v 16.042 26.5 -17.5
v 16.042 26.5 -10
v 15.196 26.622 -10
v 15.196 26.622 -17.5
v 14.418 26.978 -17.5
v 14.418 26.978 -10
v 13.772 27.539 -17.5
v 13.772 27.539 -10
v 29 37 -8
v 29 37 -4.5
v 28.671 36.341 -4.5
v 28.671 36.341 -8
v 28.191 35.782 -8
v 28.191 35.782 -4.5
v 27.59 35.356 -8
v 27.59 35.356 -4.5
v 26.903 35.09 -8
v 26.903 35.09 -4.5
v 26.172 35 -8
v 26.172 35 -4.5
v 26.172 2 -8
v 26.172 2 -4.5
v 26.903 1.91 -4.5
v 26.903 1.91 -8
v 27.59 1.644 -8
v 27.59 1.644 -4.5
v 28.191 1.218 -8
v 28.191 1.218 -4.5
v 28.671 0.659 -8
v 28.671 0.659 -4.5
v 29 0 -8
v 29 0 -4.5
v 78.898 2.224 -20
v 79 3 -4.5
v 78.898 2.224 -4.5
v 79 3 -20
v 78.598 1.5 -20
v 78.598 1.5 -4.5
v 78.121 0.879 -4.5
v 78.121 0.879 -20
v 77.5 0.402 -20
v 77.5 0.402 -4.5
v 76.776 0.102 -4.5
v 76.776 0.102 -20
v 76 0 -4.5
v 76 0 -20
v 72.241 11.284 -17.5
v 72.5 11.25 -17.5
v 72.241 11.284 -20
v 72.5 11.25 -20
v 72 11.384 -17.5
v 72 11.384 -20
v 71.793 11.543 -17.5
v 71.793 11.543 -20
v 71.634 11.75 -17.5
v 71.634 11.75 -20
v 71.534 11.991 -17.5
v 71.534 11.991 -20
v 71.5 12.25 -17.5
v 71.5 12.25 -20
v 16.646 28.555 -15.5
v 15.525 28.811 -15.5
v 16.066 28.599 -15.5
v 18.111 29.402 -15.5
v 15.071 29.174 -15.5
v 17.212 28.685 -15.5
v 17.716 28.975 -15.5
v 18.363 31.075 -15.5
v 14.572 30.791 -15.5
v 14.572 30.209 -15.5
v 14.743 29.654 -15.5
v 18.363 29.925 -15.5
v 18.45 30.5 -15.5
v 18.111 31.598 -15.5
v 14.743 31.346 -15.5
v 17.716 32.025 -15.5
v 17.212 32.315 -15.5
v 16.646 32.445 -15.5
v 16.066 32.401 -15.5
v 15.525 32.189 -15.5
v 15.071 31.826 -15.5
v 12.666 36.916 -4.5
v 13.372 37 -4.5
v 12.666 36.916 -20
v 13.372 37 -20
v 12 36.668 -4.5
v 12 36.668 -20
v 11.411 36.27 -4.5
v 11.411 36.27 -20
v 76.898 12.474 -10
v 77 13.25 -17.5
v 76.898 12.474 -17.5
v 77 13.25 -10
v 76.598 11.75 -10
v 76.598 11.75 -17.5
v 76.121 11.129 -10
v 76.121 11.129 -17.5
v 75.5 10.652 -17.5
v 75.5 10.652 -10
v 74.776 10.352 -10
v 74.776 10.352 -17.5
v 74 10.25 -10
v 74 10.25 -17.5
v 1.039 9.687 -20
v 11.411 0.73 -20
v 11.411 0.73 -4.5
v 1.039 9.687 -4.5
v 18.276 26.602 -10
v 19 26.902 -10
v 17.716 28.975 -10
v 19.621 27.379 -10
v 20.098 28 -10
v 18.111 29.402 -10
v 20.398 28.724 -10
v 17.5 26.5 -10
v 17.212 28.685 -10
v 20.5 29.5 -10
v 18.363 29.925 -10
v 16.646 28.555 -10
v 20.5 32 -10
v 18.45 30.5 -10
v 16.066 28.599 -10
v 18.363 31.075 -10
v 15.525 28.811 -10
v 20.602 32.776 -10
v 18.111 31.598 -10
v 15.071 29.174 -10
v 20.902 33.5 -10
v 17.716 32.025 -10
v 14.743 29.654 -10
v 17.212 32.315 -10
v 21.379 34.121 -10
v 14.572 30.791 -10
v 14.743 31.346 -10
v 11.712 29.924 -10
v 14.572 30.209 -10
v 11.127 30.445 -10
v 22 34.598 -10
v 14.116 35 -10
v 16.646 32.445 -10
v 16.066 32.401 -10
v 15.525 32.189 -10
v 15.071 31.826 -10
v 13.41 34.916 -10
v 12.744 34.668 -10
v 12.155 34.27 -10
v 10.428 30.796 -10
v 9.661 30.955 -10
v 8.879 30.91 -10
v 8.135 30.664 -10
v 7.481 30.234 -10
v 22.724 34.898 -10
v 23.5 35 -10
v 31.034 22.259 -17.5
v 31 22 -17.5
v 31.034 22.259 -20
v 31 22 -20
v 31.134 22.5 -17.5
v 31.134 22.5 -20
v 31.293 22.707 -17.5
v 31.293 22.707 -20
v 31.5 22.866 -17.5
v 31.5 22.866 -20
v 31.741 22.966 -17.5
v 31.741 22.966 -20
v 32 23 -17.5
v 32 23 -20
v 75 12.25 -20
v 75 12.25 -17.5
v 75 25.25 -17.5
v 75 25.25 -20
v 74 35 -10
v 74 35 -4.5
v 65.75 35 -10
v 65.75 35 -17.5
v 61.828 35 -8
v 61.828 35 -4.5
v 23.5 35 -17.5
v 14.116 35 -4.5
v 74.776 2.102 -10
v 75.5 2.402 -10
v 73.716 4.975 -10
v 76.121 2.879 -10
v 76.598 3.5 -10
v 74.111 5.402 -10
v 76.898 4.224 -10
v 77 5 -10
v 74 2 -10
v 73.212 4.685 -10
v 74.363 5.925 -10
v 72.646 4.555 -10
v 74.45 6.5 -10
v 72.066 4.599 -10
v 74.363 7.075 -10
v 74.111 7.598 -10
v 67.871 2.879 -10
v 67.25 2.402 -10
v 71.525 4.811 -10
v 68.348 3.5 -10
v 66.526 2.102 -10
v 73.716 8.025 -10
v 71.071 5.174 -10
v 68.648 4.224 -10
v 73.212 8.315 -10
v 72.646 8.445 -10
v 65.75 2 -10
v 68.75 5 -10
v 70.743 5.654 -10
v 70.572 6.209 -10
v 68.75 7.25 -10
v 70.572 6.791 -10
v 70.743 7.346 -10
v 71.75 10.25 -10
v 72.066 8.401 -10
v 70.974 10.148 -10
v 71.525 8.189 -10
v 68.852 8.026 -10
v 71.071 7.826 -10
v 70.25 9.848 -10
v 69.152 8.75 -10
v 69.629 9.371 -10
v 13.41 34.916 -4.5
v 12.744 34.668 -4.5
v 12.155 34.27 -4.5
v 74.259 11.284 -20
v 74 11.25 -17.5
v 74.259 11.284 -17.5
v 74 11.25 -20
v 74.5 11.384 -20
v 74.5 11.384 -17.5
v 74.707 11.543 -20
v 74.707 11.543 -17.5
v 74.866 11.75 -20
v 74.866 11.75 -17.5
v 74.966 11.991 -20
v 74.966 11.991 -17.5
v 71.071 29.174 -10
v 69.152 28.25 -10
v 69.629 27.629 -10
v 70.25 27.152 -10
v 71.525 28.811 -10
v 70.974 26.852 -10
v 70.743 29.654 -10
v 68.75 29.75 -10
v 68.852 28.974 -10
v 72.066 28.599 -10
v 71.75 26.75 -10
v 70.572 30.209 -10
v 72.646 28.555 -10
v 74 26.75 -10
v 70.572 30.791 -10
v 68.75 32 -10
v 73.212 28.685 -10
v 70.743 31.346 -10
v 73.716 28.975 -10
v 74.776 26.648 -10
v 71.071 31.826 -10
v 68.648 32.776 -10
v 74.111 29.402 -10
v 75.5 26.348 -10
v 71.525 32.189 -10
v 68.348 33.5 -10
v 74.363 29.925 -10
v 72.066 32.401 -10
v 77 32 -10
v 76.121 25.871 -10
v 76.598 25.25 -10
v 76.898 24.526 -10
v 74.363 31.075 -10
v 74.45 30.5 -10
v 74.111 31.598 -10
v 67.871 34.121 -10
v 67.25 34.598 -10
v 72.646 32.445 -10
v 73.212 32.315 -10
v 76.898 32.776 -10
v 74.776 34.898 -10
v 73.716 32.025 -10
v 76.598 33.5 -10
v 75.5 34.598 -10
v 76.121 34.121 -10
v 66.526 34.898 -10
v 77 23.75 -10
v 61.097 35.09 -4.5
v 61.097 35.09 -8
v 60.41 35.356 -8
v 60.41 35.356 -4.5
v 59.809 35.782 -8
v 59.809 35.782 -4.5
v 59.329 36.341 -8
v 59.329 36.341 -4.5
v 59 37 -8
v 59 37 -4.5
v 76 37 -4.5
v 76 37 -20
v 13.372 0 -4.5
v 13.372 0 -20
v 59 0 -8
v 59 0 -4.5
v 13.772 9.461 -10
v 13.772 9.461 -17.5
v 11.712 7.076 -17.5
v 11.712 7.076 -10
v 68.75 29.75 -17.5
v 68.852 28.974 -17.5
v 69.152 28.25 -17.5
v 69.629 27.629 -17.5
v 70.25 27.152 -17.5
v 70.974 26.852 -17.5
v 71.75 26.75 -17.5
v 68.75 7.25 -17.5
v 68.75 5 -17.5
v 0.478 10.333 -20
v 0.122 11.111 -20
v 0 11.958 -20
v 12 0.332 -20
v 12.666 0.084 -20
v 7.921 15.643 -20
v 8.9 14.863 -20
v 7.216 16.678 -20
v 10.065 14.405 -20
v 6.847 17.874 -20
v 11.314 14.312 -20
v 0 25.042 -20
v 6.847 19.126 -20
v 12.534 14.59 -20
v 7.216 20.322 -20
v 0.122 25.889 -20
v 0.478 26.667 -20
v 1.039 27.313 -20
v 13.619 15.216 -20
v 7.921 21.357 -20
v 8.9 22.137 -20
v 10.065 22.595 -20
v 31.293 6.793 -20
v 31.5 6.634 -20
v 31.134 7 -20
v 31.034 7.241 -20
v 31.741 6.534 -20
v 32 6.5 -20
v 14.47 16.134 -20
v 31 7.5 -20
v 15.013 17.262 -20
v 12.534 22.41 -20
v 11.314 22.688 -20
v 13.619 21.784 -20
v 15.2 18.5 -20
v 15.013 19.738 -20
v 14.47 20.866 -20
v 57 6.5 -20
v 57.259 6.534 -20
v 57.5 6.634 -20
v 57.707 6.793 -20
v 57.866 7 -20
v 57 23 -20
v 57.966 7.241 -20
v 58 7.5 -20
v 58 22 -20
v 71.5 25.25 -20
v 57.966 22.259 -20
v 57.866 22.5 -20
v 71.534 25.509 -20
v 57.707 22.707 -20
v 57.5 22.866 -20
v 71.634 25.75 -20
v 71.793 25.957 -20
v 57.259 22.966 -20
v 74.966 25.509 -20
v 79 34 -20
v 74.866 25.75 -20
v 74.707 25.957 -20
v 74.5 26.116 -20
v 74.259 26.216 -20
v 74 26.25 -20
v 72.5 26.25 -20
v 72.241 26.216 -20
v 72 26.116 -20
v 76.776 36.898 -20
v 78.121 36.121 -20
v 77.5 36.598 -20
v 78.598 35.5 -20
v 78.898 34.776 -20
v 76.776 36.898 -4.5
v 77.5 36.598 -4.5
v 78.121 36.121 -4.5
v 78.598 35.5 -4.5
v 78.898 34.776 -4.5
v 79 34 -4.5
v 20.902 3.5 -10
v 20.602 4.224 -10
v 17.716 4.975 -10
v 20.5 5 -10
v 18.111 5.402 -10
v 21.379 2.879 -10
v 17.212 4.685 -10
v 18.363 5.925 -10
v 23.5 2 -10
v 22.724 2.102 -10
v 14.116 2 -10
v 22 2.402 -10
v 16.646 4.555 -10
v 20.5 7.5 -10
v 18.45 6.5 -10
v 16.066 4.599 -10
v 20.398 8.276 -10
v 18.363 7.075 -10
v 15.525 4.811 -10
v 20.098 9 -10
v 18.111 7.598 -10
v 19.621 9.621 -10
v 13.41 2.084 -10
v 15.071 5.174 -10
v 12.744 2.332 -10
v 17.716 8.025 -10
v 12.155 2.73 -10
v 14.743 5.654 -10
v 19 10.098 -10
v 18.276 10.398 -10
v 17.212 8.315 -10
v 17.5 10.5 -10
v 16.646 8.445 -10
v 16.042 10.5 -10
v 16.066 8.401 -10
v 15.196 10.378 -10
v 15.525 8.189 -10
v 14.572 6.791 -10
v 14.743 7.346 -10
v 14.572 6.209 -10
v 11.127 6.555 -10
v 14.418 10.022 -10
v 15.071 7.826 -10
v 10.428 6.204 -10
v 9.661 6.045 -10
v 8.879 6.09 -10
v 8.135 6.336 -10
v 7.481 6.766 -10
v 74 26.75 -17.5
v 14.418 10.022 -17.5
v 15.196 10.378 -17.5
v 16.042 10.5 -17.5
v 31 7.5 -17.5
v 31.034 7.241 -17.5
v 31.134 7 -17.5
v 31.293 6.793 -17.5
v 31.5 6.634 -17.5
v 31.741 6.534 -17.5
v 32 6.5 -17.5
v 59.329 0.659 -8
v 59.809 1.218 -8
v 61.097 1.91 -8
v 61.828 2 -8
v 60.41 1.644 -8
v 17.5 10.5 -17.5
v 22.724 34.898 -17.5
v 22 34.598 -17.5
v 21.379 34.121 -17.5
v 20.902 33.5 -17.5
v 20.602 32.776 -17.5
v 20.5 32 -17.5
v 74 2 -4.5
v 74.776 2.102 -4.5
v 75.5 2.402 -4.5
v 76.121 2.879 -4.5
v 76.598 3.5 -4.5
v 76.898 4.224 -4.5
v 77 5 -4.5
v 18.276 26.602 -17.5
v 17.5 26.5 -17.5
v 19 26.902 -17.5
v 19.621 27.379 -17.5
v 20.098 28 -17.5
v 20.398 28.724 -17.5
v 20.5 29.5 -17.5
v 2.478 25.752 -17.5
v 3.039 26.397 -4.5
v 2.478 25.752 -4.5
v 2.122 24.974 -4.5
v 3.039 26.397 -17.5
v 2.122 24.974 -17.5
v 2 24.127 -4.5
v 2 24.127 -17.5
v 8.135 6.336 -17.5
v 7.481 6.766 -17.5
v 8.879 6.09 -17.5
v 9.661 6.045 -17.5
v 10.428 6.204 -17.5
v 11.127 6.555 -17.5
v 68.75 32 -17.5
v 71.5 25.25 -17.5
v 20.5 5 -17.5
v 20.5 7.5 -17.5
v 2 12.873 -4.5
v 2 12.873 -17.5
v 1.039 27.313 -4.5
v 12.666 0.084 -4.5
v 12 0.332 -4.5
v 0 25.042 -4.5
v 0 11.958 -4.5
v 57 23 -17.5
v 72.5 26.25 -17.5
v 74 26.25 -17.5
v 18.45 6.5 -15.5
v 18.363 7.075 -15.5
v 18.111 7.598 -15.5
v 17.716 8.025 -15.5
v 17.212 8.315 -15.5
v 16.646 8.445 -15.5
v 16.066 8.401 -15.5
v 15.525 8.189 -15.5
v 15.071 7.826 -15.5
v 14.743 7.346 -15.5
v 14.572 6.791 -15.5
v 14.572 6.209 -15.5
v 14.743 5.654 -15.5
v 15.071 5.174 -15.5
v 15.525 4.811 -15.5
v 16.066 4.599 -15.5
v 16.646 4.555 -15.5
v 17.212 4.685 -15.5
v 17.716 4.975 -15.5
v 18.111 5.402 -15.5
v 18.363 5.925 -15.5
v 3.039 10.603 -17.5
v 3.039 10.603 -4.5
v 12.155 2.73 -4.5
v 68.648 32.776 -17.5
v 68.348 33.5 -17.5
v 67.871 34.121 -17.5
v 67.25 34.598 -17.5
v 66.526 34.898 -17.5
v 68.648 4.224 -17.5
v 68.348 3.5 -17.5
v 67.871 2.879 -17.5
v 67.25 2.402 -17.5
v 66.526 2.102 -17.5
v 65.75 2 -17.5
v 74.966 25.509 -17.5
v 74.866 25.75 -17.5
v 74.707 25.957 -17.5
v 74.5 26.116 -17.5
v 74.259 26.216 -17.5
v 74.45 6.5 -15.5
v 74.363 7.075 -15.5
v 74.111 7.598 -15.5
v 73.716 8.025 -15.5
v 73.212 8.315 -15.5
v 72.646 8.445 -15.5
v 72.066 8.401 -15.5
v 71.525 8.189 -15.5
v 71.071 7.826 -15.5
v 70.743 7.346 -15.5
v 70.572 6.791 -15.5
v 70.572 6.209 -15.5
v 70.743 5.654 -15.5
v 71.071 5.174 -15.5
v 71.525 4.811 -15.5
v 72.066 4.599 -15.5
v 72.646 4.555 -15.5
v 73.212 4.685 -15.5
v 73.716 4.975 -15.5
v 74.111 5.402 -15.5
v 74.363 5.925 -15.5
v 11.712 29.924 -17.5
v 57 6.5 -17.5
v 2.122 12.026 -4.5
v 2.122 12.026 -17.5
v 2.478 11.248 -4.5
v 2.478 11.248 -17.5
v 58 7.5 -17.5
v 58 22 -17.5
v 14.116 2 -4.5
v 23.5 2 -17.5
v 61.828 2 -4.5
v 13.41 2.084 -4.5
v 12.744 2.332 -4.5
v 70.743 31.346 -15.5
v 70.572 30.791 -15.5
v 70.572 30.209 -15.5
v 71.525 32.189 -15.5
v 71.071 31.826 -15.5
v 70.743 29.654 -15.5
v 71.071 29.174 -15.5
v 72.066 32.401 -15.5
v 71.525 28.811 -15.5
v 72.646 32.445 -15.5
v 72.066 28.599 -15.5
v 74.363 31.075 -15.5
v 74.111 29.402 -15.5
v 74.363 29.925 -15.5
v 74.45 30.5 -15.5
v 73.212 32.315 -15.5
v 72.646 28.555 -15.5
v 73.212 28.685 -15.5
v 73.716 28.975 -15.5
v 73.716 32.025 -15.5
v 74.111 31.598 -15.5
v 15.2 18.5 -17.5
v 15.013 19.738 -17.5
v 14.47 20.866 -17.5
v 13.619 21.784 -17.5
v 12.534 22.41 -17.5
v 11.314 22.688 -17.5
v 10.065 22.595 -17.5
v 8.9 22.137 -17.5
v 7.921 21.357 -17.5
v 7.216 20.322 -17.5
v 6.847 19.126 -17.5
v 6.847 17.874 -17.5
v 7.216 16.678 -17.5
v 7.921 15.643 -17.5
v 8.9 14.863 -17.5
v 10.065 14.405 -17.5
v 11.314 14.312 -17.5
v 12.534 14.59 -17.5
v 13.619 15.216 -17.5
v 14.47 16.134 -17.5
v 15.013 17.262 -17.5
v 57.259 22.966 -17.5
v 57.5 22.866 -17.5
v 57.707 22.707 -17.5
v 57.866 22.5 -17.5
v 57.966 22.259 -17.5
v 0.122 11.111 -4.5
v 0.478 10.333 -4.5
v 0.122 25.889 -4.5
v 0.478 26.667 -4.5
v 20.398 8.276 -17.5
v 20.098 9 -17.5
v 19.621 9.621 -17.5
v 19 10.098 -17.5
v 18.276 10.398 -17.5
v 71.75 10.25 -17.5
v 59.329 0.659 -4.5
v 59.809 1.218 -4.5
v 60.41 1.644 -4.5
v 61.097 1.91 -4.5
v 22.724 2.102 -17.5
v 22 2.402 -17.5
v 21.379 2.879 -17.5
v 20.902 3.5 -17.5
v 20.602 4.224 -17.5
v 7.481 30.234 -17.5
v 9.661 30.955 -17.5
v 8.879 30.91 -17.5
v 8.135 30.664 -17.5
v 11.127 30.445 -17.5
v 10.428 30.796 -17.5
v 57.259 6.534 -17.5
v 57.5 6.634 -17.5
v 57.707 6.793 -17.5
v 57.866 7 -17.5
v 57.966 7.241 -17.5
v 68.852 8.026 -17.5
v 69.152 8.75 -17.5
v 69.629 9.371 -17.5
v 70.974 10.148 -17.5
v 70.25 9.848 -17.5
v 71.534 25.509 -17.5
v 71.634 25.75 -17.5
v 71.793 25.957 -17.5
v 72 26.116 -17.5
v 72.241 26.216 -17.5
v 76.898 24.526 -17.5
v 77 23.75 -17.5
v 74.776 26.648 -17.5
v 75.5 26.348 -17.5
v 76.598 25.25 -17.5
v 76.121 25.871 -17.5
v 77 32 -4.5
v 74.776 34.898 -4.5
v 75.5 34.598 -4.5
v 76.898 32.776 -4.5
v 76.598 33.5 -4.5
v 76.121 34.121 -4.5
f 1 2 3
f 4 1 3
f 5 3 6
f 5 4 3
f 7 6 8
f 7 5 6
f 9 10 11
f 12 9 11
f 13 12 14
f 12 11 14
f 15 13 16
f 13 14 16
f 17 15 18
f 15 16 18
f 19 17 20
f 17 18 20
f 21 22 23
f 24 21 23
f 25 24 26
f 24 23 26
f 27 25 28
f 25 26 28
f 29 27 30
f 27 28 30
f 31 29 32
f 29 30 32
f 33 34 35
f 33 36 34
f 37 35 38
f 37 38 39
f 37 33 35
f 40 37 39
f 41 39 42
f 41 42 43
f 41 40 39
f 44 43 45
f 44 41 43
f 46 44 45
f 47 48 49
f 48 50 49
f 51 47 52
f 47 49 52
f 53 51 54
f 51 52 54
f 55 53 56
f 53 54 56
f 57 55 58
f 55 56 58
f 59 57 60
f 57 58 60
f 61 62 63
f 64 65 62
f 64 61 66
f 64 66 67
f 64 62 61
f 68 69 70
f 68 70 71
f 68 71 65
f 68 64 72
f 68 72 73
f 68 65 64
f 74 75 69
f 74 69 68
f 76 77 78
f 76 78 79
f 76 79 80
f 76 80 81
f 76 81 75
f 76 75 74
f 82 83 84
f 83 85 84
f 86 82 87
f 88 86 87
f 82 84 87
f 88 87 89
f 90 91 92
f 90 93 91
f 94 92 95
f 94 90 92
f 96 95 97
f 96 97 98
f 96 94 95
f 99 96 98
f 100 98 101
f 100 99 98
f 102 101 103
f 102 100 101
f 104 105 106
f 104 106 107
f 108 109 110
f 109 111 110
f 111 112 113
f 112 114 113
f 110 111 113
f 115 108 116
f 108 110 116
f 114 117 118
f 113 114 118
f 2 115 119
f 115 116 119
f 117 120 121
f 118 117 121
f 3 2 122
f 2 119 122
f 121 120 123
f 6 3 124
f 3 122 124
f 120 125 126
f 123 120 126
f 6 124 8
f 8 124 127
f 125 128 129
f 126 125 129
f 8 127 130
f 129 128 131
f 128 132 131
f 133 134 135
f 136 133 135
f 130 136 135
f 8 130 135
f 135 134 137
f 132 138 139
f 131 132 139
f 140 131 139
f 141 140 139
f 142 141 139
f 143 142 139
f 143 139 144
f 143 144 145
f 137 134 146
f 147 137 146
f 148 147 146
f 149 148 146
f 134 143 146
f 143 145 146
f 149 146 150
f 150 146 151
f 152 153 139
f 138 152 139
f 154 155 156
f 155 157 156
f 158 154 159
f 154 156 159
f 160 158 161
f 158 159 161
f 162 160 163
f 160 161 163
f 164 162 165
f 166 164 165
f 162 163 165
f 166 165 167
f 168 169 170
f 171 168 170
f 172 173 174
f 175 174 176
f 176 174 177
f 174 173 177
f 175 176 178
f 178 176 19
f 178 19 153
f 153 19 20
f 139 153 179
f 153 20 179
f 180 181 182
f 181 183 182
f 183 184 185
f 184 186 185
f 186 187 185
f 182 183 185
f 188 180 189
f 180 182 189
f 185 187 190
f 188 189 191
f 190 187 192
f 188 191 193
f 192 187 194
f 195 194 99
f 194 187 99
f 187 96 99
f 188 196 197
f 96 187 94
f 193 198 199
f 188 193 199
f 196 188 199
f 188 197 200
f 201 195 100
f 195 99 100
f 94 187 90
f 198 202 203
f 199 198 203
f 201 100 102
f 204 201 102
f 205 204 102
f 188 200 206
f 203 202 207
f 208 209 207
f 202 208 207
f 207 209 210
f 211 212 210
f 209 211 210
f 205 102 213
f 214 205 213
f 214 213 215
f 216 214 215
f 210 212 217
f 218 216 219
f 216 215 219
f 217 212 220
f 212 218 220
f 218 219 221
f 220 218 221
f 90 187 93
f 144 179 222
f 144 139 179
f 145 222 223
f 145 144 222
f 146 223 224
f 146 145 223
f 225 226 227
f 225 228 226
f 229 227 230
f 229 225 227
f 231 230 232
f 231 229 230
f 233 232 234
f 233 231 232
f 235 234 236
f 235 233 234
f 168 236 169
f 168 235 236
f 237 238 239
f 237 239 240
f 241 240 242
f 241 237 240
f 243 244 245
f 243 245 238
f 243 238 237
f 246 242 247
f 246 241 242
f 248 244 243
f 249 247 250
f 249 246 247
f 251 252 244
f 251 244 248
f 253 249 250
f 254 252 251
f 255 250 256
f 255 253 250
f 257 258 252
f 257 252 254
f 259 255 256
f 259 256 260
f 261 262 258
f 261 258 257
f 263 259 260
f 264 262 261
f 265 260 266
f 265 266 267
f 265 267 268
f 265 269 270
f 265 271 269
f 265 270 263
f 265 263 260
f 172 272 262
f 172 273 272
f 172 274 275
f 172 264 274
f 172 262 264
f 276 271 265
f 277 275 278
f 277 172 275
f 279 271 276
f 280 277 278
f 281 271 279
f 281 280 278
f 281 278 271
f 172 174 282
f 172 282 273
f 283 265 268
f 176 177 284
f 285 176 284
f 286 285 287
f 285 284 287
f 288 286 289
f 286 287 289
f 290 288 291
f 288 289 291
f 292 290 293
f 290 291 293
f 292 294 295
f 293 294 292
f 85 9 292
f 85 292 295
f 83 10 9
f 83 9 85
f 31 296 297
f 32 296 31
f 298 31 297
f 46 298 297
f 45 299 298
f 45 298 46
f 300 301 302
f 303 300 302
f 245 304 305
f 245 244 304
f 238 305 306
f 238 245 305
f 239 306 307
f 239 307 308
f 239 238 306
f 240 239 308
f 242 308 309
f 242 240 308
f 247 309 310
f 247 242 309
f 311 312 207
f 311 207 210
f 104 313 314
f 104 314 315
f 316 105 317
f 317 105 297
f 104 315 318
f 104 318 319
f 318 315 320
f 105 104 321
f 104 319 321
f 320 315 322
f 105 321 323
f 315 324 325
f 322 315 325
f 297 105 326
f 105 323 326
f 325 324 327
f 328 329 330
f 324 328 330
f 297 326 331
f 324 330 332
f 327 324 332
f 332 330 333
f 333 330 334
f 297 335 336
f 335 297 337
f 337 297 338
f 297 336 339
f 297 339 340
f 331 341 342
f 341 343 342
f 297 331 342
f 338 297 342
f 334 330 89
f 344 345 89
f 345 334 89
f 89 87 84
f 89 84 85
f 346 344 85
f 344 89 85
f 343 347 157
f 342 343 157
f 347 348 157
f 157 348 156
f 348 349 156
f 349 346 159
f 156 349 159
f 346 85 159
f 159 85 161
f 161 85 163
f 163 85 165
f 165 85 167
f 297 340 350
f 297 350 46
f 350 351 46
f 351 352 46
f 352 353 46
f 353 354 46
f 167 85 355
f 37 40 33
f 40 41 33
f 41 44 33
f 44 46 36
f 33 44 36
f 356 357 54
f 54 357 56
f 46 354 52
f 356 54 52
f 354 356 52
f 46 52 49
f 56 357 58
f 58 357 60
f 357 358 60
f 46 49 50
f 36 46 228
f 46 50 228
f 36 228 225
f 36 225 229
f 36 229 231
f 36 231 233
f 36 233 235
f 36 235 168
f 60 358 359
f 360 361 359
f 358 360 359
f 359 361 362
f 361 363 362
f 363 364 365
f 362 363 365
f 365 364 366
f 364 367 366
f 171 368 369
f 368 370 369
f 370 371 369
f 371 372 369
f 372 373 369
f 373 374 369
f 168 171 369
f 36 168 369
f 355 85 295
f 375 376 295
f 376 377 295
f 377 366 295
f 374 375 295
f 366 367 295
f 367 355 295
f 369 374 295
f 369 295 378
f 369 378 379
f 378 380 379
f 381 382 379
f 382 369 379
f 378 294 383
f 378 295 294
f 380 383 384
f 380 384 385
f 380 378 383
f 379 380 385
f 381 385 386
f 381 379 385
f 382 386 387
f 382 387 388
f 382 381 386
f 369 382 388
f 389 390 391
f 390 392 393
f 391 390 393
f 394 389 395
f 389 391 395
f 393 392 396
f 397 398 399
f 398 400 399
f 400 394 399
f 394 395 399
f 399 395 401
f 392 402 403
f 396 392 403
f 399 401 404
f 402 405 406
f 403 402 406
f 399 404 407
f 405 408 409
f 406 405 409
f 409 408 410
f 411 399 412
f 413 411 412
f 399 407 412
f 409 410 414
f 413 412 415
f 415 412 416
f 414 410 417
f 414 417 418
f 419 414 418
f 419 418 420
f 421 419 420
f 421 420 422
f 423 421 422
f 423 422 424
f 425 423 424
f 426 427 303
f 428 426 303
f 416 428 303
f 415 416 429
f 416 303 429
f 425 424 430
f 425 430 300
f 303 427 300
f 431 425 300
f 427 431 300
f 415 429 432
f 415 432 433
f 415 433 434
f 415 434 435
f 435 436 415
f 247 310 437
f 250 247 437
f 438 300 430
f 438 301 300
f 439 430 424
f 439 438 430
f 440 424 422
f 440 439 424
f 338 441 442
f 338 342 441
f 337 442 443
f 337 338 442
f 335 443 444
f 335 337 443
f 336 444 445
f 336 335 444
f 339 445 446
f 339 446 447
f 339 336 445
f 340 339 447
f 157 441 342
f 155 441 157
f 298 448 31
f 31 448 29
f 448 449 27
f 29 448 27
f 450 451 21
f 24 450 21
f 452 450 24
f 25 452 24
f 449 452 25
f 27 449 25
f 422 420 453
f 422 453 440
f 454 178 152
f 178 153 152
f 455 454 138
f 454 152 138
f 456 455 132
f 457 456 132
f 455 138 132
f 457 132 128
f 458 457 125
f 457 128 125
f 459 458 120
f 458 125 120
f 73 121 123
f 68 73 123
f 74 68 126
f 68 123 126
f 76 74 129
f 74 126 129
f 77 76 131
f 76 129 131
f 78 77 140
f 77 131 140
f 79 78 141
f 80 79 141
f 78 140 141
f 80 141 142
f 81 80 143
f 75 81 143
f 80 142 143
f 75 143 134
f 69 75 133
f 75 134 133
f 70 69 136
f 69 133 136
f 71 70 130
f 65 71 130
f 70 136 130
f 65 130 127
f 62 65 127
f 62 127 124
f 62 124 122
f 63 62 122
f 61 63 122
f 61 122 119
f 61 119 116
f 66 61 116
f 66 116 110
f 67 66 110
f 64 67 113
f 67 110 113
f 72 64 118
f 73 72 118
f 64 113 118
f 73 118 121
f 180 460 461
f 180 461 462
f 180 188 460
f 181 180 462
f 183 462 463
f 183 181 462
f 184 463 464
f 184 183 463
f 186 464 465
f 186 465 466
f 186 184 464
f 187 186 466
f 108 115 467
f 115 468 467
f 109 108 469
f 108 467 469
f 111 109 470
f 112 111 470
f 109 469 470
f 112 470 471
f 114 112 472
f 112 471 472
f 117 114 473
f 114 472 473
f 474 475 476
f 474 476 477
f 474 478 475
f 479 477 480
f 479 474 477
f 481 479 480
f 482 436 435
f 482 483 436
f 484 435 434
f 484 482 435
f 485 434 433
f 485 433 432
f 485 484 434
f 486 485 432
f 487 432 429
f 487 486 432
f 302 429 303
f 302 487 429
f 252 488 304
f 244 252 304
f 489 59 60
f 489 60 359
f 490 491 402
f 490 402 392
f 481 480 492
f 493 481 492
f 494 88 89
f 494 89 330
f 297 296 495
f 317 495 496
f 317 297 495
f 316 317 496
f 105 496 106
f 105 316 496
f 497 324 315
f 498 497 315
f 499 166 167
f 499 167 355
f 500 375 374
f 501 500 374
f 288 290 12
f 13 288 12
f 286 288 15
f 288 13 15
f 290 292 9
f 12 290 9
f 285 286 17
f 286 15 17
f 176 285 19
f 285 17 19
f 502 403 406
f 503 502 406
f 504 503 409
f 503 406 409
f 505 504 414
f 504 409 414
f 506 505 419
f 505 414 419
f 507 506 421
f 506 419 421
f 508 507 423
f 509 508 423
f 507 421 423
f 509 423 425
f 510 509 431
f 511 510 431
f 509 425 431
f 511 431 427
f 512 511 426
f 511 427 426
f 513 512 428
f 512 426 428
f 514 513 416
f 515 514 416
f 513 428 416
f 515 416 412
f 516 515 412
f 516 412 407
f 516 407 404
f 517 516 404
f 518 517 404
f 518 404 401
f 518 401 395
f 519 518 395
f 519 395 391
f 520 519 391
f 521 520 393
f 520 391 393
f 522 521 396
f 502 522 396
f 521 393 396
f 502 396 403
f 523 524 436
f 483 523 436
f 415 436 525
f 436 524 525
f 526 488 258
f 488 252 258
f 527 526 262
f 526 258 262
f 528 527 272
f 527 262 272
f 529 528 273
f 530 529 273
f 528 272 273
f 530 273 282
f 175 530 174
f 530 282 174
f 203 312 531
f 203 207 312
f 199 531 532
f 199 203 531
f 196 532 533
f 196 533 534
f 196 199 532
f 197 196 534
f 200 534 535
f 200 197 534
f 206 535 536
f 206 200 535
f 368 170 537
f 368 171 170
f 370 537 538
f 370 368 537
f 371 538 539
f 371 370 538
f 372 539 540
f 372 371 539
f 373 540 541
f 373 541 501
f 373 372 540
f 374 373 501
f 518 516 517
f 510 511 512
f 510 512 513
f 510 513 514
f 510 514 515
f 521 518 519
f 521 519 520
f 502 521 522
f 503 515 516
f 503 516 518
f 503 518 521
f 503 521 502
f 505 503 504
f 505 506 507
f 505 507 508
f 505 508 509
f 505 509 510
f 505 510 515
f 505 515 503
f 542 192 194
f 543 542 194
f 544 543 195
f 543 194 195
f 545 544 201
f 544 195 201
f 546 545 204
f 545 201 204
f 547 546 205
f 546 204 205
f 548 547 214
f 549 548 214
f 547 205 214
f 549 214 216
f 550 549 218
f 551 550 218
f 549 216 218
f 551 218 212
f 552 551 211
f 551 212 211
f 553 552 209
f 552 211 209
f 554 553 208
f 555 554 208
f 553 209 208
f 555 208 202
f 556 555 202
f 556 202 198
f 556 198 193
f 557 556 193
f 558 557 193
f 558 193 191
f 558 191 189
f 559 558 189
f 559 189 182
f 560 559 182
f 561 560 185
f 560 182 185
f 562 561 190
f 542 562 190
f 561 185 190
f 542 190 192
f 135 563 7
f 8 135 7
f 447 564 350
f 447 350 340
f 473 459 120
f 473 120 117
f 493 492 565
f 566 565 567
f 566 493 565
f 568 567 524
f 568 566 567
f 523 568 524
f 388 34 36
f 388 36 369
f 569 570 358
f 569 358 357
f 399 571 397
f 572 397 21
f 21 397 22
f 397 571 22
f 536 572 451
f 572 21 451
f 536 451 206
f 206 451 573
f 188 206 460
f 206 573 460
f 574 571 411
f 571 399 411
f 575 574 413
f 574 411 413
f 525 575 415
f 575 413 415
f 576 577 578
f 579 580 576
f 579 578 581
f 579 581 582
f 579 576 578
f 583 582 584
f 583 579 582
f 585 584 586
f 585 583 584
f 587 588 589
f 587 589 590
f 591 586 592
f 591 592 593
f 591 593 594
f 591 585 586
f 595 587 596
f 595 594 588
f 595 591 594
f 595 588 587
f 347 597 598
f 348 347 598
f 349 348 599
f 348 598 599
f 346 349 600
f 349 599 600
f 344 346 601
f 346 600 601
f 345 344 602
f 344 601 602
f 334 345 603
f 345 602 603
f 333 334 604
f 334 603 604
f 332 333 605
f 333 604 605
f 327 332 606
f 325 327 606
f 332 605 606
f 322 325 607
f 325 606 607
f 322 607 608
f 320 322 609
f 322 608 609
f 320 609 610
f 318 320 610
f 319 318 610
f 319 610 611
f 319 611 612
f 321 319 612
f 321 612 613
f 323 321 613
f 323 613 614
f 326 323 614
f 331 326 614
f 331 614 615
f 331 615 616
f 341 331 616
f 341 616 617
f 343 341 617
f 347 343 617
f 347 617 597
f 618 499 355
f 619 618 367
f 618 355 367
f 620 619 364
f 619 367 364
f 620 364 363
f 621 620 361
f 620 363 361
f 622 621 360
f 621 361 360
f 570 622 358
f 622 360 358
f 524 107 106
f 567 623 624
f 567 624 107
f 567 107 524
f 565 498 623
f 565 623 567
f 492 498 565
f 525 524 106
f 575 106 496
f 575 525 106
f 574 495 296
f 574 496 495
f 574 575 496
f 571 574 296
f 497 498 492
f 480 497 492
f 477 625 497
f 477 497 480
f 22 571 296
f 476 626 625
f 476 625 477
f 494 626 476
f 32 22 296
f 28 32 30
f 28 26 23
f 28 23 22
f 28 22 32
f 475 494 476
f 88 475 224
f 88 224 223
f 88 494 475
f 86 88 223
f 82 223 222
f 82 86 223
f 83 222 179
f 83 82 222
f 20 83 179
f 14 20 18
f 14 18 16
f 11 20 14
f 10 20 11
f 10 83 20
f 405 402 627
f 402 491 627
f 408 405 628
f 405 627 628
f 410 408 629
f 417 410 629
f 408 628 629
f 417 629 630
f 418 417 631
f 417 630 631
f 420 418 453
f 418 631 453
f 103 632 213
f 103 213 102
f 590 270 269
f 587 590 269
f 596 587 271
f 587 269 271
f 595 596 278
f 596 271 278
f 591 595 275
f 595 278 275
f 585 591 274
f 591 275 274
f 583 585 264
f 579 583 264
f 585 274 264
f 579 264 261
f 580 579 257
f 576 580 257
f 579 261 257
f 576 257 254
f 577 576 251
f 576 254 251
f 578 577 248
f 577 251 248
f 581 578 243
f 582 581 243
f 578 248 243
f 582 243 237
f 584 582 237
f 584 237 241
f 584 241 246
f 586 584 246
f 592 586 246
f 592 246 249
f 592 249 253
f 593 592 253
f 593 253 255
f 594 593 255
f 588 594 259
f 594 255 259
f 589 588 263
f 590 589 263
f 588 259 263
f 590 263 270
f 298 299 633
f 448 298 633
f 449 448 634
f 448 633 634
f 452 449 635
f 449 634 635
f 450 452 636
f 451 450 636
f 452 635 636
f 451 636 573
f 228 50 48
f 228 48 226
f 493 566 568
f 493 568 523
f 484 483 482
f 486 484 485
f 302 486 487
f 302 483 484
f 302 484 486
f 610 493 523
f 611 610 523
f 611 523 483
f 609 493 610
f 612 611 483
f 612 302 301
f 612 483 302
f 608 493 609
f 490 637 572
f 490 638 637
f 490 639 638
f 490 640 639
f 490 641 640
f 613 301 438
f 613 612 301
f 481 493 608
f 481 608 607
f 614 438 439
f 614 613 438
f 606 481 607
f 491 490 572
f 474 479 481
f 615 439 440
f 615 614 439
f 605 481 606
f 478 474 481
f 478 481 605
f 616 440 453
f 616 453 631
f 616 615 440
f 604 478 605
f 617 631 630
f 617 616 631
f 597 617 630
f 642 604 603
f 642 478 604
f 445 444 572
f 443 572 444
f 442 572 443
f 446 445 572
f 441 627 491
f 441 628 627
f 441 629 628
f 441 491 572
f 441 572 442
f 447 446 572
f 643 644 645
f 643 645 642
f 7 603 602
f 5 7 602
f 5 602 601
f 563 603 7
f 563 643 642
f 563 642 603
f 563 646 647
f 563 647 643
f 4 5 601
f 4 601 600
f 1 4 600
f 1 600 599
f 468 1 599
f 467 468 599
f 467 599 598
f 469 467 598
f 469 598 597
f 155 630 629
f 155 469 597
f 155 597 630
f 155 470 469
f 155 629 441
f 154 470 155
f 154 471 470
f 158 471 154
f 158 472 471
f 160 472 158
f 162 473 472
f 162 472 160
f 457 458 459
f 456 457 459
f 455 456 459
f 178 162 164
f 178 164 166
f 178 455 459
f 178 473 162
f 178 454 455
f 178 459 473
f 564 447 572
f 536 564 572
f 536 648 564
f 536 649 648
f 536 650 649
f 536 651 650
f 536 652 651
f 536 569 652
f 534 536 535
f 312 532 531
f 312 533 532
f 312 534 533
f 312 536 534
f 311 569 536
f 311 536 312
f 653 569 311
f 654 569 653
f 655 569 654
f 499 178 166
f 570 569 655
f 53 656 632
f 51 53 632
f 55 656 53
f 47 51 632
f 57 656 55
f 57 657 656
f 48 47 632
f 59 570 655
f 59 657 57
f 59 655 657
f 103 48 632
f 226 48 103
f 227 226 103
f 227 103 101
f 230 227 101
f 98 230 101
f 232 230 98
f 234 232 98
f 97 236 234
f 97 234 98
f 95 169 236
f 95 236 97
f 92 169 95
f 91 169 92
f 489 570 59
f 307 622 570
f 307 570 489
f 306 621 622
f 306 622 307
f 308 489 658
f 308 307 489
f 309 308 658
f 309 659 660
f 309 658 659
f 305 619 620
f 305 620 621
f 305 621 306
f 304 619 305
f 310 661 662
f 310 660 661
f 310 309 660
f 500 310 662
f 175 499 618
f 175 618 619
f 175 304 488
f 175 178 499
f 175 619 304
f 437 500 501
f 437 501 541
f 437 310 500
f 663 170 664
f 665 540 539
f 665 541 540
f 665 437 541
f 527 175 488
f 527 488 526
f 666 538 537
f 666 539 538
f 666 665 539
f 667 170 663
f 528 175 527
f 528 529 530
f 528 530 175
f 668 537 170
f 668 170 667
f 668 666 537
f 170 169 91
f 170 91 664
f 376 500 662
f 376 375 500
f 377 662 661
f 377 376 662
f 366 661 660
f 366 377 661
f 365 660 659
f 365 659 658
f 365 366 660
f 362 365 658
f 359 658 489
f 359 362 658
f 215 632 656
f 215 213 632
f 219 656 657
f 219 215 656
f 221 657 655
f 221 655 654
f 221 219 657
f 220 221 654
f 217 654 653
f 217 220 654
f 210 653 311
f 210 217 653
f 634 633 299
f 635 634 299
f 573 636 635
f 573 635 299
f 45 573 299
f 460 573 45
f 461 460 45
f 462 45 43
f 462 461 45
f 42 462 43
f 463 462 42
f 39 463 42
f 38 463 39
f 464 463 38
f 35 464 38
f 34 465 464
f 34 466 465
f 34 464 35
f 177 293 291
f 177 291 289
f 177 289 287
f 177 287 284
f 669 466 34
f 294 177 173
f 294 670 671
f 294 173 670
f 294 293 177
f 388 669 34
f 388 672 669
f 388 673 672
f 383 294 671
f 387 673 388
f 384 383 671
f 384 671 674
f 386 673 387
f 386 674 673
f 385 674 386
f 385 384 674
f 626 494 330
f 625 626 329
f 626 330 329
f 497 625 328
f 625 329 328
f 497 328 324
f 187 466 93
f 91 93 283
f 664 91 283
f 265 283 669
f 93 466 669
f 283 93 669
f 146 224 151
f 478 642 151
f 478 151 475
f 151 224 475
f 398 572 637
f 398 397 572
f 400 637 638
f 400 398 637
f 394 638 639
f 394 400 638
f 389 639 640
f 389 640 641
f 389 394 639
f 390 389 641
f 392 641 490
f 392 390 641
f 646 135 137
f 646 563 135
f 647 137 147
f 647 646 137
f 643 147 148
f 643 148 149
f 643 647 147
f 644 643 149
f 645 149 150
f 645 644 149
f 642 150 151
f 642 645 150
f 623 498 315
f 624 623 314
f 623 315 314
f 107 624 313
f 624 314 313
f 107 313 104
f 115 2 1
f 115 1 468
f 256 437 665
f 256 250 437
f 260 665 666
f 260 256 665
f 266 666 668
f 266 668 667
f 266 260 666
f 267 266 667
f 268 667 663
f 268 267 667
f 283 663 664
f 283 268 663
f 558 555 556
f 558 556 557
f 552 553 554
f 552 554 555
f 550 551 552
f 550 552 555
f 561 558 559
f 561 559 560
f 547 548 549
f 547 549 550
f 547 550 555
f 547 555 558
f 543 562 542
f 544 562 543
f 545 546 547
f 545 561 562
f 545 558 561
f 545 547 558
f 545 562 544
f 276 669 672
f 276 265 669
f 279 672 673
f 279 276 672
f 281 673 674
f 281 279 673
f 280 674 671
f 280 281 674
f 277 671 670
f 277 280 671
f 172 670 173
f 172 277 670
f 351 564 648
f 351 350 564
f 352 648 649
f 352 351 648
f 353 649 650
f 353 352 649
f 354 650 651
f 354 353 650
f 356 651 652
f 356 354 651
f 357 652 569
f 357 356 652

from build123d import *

# Parameters (mm, degrees)
BOSS_EXTRUDE1_DEPTH = 19.999999999999996
CUT_EXTRUDE1_DEPTH  = 17.5
CUT_EXTRUDE2_DEPTH  = 20
BOSS_EXTRUDE2_DEPTH = 7.5
SKETCH5_R           = 1.949999999999999
SKETCH5_R_2         = 1.949999999999998
SKETCH5_R_3         = 1.9499999999999986
CUT_EXTRUDE3_DEPTH  = 5.5
SKETCH6_R           = 4.199999999999999
CUT_EXTRUDE4_DEPTH  = 10
CUT_EXTRUDE5_DEPTH  = 2.5
CUT_EXTRUDE10_DEPTH = 7.5
SKETCH13_W          = 78.99999999999999
SKETCH13_H          = 37
CUT_EXTRUDE11_DEPTH = 4.5
CUT_EXTRUDE12_DEPTH = 3.5
SKETCH9_W           = 3.5
SKETCH9_H           = 15.000000000000004
CUT_EXTRUDE7_DEPTH  = 2.5
FILLET2_R           = 3
FILLET18_R          = 3
FILLET19_R          = 3
FILLET11_R          = 3
FILLET12_R          = 1
FILLET14_R          = 3
FILLET15_R          = 3
FILLET13_R          = 1
FILLET20_R          = 3


with BuildPart() as part:
    # Sketch1 → Boss-Extrude1 (new body)
    with BuildSketch(Plane.XY):
        Polygon((0, 0), (78.99999999999999, 0), (78.99999999999999, 37), (-6.72e-15, 37), align=None)
    extrude(amount=-BOSS_EXTRUDE1_DEPTH)

    # Sketch2 → Cut-Extrude1 (cut)
    with BuildSketch(Plane.XY):
        Polygon((76.99999999999999, 34.99999999999999), (12.999999999999984, 34.99999999999999), (1.9999999999999831, 25.499999999999996), (1.9999999999999718, 11.5), (13.000000000000004, 1.9999999999999922), (76.99999999999999, 2.0000000000000004), align=None)
    extrude(amount=-CUT_EXTRUDE1_DEPTH, mode=Mode.SUBTRACT)

    # Sketch3 → Cut-Extrude2 (cut)
    with BuildSketch(Plane.XY):
        Polygon((12.255906978158162, 37), (-6.72e-15, 26.41535306431793), (0, 37), align=None)
        Polygon((12.255906978158176, 1e-17), (1.389e-14, 10.584646935682041), (0, 0), align=None)
    extrude(amount=-CUT_EXTRUDE2_DEPTH, mode=Mode.SUBTRACT)

    # Sketch4 → Boss-Extrude2 (add)
    with BuildSketch(Plane.XY.offset(-17.5)):
        Polygon((76.99999999999999, 34.99999999999999), (68.74999999999999, 34.99999999999999), (68.74999999999999, 26.75), (76.99999999999997, 26.75), align=None)
        Polygon((12.999999999999984, 34.99999999999999), (20.49999999999999, 34.99999999999999), (20.49999999999999, 1.9999999999999922), (13.000000000000004, 1.9999999999999922), (1.9999999999999896, 11.49999999999998), (1.9999999999999882, 25.49999999999998), align=None)
        Polygon((76.99999999999999, 2), (68.74999999999999, 2.000000000000003), (68.74999999999999, 10.249999999999996), (76.99999999999999, 10.249999999999998), align=None)
    extrude(amount=BOSS_EXTRUDE2_DEPTH)

    # Sketch5 → Cut-Extrude3 (cut)
    with BuildSketch(Plane.XY.offset(-10.000000000000002)):
        with Locations((16.499999999999986, 30.5)):
            Circle(SKETCH5_R)
        with Locations((72.49999999999999, 30.5)):
            Circle(SKETCH5_R_2)
        with Locations((72.49999999999999, 6.499999999999999)):
            Circle(SKETCH5_R_3)
        with Locations((16.499999999999986, 6.499999999999985)):
            Circle(SKETCH5_R)
    extrude(amount=-CUT_EXTRUDE3_DEPTH, mode=Mode.SUBTRACT)

    # Sketch6 → Cut-Extrude4 (cut)
    with BuildSketch(Plane.XY.offset(-10.000000000000002)):
        with Locations((10.999999999999988, 18.5)):
            Circle(SKETCH6_R)
    extrude(amount=-CUT_EXTRUDE4_DEPTH, mode=Mode.SUBTRACT)

    # Sketch7 → Cut-Extrude5 (cut)
    with BuildSketch(Plane.XY.offset(-17.5)):
        Polygon((30.999999999999986, 23), (57.99999999999998, 23.000000000000004), (57.99999999999998, 6.500000000000003), (30.99999999999999, 6.499999999999999), align=None)
    extrude(amount=-CUT_EXTRUDE5_DEPTH, mode=Mode.SUBTRACT)

    # Sketch12 → Cut-Extrude10 (cut)
    with BuildSketch(Plane.XY.offset(-10.000000000000002)):
        Polygon((9.751406193775388, 32.19439625826063), (14.669293871364125, 26.5), (20.49999999999999, 26.5), (20.499999999999993, 10.499999999999986), (14.669293871364117, 10.499999999999986), (9.751406193775411, 4.805603741739363), (2.000000000000001, 11.499999999999991), (1.9999999999999862, 25.499999999999975), align=None)
    extrude(amount=-CUT_EXTRUDE10_DEPTH, mode=Mode.SUBTRACT)

    # Sketch13 → Cut-Extrude11 (cut)
    with BuildSketch(Plane.XY):
        with Locations((39.49999999999999, 18.5)):
            Rectangle(SKETCH13_W, SKETCH13_H)
    extrude(amount=-CUT_EXTRUDE11_DEPTH, mode=Mode.SUBTRACT)

    # Sketch14 → Cut-Extrude12 (cut)
    with BuildSketch(Plane.XY.offset(-4.5)):
        Polygon((28.999999999999986, 37), (58.999999999999986, 37.00000000000001), (58.999999999999986, 35), (28.999999999999986, 34.99999999999999), align=None)
        Polygon((28.999999999999986, 1.9999999999999931), (58.999999999999986, 1.9999999999999987), (58.999999999999986, 0), (28.999999999999986, -5.51e-15), align=None)
    extrude(amount=-CUT_EXTRUDE12_DEPTH, mode=Mode.SUBTRACT)

    # Sketch9 → Cut-Extrude7 (cut)
    with BuildSketch(Plane.XY.offset(-17.5)):
        with Locations((73.24999999999999, 18.75)):
            Rectangle(SKETCH9_W, SKETCH9_H)
    extrude(amount=-CUT_EXTRUDE7_DEPTH, mode=Mode.SUBTRACT)

    # Fillet2
    fillet2_edges = [part.edges().sort_by_distance(p)[0] for p in [
        (76.99999999999997, 26.75, -13.75),
        (68.74999999999999, 34.99999999999999, -13.75),
        (20.49999999999999, 1.9999999999999922, -13.75),
        (20.49999999999999, 34.99999999999999, -13.75),
        (76.99999999999999, 10.249999999999998, -13.75),
        (68.74999999999999, 2.000000000000003, -13.75),
    ]]
    fillet(fillet2_edges, radius=FILLET2_R)

    # Fillet18
    fillet18_edges = [part.edges().sort_by_distance(p)[0] for p in [
        (20.499999999999993, 10.499999999999986, -13.750000000000002),
        (20.49999999999999, 26.5, -13.750000000000002),
        (68.74999999999999, 26.75, -13.75),
        (68.74999999999999, 10.249999999999996, -13.75),
    ]]
    fillet(fillet18_edges, radius=FILLET18_R)

    # Fillet19
    fillet19_edges = [part.edges().sort_by_distance(p)[0] for p in [
        (9.751406193775411, 4.805603741739363, -13.750000000000002),
        (14.669293871364117, 10.499999999999986, -13.750000000000002),
        (14.669293871364125, 26.5, -13.750000000000002),
        (9.751406193775388, 32.19439625826063, -13.750000000000002),
    ]]
    fillet(fillet19_edges, radius=FILLET19_R)

    # Fillet11
    fillet11_edges = [part.edges().sort_by_distance(p)[0] for p in [
        (-6.72e-15, 26.41535306431793, -12.25),
        (12.255906978158162, 37, -12.25),
        (1.389e-14, 10.584646935682041, -12.25),
        (12.255906978158176, 1e-17, -12.25),
        (78.99999999999999, 37, -12.249999999999998),
        (78.99999999999999, 0, -12.249999999999998),
    ]]
    fillet(fillet11_edges, radius=FILLET11_R)

    # Fillet12
    fillet12_edges = [part.edges().sort_by_distance(p)[0] for p in [
        (57.99999999999998, 6.500000000000003, -18.75),
        (57.99999999999998, 23.000000000000004, -18.75),
        (30.999999999999986, 23, -18.75),
        (30.99999999999999, 6.499999999999999, -18.75),
    ]]
    fillet(fillet12_edges, radius=FILLET12_R)

    # Fillet14
    # the kernel refuses this fillet: 3 mm, written as the material it takes off along each edge
    with BuildSketch(Plane(origin=(58.999999999999986, 1.9999999999999982, 2.5710678118654613), x_dir=(-3.55e-15, -1, 0), z_dir=(0, 0, -1))) as fillet14_piece_1:
        with BuildLine():
            CenterArc((2.99999999999999, -2.828427124746195), FILLET14_R, 109.47122063449055, 70.52877936550925)
            Line((-1.027e-14, -2.8284271247461845), (-0.0600000000000101, -2.8284271247461845))
            Line((-0.0600000000000101, -2.8284271247461845), (-0.06000000000000005, 2.1e-16))
            Line((-0.06000000000000005, 2.1e-16), (2.1e-16, 0.06000000000000227))
            ThreePointArc((2.1e-16, 0.06000000000000227), (0.9999999999999986, 0.05999999999999872), (1.9799999999999969, 0.05656854249492234))
            Line((1.9799999999999969, 0.05656854249492234), (1.9999999999999967, 0))
        make_face()
    extrude(amount=10.571067811865461, mode=Mode.SUBTRACT)
    with BuildSketch(Plane(origin=(28.999999999999986, 1.9999999999999942, 2.571067811865479), x_dir=(0, -1, 0), z_dir=(0, 0, -1))) as fillet14_piece_2:
        with BuildLine():
            CenterArc((3, 2.8284271247461916), FILLET14_R, 180, 70.52877936550931)
            Line((2.2e-16, 2.8284271247461916), (-0.05999999999999961, 2.8284271247461916))
            Line((-0.05999999999999961, 2.8284271247461916), (-0.06000000000000005, 0))
            Line((-0.06000000000000005, 0), (0, -0.05999999999999872))
            ThreePointArc((0, -0.05999999999999872), (1.0000000000000002, -0.05999999999999872), (1.9800000000000004, -0.05656854249492227))
            Line((1.9800000000000004, -0.05656854249492227), (2.0000000000000004, 0))
        make_face()
    extrude(amount=10.571067811865479, mode=Mode.SUBTRACT)
    with BuildSketch(Plane(origin=(58.999999999999986, 34.99999999999999, 2.571067811865479), x_dir=(0, 1, 0), z_dir=(0, 0, -1))) as fillet14_piece_3:
        with BuildLine():
            CenterArc((3, 2.8284271247461916), FILLET14_R, 180, 70.52877936550954)
            Line((0, 2.8284271247461916), (-0.06000000000000227, 2.8284271247461916))
            Line((-0.06000000000000227, 2.8284271247461916), (-0.06000000000000227, 0))
            Line((-0.06000000000000227, 0), (0, -0.06000000000000227))
            ThreePointArc((0, -0.06000000000000227), (1.000000000000007, -0.06000000000000227), (1.980000000000011, -0.05656854249492227))
            Line((1.980000000000011, -0.05656854249492227), (2.000000000000014, 0))
        make_face()
    extrude(amount=10.571067811865479, mode=Mode.SUBTRACT)
    with BuildSketch(Plane(origin=(28.999999999999986, 34.99999999999999, 2.571067811865479), x_dir=(0, 1, 0), z_dir=(0, 0, -1))) as fillet14_piece_4:
        with BuildLine():
            CenterArc((3, -2.8284271247461916), FILLET14_R, 109.47122063449056, 70.52877936550944)
            Line((0, -2.8284271247461916), (-0.06000000000000227, -2.8284271247461916))
            Line((-0.06000000000000227, -2.8284271247461916), (-0.06000000000000227, 0))
            Line((-0.06000000000000227, 0), (0, 0.05999999999999872))
            ThreePointArc((0, 0.05999999999999872), (1.000000000000007, 0.05999999999999872), (1.980000000000004, 0.05656854249492227))
            Line((1.980000000000004, 0.05656854249492227), (2.000000000000007, 0))
        make_face()
    extrude(amount=10.571067811865479, mode=Mode.SUBTRACT)

    # Fillet15
    fillet15_edges = [part.edges().sort_by_distance(p)[0] for p in [
        (76.99999999999999, 34.99999999999999, -7.25),
        (12.999999999999984, 34.99999999999999, -7.25),
        (13.000000000000004, 1.9999999999999922, -7.25),
        (76.99999999999999, 2.0000000000000004, -7.25),
    ]]
    fillet(fillet15_edges, radius=FILLET15_R)

    # Fillet13
    fillet13_edges = [part.edges().sort_by_distance(p)[0] for p in [
        (74.99999999999999, 11.25, -18.75),
        (74.99999999999999, 26.25, -18.75),
        (71.49999999999999, 26.25, -18.75),
        (71.49999999999999, 11.25, -18.75),
    ]]
    fillet(fillet13_edges, radius=FILLET13_R)

    # Fillet20
    fillet20_edges = [part.edges().sort_by_distance(p)[0] for p in [
        (1.9999999999999851, 25.499999999999982, -11),
        (1.99999999999999, 11.499999999999995, -11),
    ]]
    fillet(fillet20_edges, radius=FILLET20_R)


solid = part.part
